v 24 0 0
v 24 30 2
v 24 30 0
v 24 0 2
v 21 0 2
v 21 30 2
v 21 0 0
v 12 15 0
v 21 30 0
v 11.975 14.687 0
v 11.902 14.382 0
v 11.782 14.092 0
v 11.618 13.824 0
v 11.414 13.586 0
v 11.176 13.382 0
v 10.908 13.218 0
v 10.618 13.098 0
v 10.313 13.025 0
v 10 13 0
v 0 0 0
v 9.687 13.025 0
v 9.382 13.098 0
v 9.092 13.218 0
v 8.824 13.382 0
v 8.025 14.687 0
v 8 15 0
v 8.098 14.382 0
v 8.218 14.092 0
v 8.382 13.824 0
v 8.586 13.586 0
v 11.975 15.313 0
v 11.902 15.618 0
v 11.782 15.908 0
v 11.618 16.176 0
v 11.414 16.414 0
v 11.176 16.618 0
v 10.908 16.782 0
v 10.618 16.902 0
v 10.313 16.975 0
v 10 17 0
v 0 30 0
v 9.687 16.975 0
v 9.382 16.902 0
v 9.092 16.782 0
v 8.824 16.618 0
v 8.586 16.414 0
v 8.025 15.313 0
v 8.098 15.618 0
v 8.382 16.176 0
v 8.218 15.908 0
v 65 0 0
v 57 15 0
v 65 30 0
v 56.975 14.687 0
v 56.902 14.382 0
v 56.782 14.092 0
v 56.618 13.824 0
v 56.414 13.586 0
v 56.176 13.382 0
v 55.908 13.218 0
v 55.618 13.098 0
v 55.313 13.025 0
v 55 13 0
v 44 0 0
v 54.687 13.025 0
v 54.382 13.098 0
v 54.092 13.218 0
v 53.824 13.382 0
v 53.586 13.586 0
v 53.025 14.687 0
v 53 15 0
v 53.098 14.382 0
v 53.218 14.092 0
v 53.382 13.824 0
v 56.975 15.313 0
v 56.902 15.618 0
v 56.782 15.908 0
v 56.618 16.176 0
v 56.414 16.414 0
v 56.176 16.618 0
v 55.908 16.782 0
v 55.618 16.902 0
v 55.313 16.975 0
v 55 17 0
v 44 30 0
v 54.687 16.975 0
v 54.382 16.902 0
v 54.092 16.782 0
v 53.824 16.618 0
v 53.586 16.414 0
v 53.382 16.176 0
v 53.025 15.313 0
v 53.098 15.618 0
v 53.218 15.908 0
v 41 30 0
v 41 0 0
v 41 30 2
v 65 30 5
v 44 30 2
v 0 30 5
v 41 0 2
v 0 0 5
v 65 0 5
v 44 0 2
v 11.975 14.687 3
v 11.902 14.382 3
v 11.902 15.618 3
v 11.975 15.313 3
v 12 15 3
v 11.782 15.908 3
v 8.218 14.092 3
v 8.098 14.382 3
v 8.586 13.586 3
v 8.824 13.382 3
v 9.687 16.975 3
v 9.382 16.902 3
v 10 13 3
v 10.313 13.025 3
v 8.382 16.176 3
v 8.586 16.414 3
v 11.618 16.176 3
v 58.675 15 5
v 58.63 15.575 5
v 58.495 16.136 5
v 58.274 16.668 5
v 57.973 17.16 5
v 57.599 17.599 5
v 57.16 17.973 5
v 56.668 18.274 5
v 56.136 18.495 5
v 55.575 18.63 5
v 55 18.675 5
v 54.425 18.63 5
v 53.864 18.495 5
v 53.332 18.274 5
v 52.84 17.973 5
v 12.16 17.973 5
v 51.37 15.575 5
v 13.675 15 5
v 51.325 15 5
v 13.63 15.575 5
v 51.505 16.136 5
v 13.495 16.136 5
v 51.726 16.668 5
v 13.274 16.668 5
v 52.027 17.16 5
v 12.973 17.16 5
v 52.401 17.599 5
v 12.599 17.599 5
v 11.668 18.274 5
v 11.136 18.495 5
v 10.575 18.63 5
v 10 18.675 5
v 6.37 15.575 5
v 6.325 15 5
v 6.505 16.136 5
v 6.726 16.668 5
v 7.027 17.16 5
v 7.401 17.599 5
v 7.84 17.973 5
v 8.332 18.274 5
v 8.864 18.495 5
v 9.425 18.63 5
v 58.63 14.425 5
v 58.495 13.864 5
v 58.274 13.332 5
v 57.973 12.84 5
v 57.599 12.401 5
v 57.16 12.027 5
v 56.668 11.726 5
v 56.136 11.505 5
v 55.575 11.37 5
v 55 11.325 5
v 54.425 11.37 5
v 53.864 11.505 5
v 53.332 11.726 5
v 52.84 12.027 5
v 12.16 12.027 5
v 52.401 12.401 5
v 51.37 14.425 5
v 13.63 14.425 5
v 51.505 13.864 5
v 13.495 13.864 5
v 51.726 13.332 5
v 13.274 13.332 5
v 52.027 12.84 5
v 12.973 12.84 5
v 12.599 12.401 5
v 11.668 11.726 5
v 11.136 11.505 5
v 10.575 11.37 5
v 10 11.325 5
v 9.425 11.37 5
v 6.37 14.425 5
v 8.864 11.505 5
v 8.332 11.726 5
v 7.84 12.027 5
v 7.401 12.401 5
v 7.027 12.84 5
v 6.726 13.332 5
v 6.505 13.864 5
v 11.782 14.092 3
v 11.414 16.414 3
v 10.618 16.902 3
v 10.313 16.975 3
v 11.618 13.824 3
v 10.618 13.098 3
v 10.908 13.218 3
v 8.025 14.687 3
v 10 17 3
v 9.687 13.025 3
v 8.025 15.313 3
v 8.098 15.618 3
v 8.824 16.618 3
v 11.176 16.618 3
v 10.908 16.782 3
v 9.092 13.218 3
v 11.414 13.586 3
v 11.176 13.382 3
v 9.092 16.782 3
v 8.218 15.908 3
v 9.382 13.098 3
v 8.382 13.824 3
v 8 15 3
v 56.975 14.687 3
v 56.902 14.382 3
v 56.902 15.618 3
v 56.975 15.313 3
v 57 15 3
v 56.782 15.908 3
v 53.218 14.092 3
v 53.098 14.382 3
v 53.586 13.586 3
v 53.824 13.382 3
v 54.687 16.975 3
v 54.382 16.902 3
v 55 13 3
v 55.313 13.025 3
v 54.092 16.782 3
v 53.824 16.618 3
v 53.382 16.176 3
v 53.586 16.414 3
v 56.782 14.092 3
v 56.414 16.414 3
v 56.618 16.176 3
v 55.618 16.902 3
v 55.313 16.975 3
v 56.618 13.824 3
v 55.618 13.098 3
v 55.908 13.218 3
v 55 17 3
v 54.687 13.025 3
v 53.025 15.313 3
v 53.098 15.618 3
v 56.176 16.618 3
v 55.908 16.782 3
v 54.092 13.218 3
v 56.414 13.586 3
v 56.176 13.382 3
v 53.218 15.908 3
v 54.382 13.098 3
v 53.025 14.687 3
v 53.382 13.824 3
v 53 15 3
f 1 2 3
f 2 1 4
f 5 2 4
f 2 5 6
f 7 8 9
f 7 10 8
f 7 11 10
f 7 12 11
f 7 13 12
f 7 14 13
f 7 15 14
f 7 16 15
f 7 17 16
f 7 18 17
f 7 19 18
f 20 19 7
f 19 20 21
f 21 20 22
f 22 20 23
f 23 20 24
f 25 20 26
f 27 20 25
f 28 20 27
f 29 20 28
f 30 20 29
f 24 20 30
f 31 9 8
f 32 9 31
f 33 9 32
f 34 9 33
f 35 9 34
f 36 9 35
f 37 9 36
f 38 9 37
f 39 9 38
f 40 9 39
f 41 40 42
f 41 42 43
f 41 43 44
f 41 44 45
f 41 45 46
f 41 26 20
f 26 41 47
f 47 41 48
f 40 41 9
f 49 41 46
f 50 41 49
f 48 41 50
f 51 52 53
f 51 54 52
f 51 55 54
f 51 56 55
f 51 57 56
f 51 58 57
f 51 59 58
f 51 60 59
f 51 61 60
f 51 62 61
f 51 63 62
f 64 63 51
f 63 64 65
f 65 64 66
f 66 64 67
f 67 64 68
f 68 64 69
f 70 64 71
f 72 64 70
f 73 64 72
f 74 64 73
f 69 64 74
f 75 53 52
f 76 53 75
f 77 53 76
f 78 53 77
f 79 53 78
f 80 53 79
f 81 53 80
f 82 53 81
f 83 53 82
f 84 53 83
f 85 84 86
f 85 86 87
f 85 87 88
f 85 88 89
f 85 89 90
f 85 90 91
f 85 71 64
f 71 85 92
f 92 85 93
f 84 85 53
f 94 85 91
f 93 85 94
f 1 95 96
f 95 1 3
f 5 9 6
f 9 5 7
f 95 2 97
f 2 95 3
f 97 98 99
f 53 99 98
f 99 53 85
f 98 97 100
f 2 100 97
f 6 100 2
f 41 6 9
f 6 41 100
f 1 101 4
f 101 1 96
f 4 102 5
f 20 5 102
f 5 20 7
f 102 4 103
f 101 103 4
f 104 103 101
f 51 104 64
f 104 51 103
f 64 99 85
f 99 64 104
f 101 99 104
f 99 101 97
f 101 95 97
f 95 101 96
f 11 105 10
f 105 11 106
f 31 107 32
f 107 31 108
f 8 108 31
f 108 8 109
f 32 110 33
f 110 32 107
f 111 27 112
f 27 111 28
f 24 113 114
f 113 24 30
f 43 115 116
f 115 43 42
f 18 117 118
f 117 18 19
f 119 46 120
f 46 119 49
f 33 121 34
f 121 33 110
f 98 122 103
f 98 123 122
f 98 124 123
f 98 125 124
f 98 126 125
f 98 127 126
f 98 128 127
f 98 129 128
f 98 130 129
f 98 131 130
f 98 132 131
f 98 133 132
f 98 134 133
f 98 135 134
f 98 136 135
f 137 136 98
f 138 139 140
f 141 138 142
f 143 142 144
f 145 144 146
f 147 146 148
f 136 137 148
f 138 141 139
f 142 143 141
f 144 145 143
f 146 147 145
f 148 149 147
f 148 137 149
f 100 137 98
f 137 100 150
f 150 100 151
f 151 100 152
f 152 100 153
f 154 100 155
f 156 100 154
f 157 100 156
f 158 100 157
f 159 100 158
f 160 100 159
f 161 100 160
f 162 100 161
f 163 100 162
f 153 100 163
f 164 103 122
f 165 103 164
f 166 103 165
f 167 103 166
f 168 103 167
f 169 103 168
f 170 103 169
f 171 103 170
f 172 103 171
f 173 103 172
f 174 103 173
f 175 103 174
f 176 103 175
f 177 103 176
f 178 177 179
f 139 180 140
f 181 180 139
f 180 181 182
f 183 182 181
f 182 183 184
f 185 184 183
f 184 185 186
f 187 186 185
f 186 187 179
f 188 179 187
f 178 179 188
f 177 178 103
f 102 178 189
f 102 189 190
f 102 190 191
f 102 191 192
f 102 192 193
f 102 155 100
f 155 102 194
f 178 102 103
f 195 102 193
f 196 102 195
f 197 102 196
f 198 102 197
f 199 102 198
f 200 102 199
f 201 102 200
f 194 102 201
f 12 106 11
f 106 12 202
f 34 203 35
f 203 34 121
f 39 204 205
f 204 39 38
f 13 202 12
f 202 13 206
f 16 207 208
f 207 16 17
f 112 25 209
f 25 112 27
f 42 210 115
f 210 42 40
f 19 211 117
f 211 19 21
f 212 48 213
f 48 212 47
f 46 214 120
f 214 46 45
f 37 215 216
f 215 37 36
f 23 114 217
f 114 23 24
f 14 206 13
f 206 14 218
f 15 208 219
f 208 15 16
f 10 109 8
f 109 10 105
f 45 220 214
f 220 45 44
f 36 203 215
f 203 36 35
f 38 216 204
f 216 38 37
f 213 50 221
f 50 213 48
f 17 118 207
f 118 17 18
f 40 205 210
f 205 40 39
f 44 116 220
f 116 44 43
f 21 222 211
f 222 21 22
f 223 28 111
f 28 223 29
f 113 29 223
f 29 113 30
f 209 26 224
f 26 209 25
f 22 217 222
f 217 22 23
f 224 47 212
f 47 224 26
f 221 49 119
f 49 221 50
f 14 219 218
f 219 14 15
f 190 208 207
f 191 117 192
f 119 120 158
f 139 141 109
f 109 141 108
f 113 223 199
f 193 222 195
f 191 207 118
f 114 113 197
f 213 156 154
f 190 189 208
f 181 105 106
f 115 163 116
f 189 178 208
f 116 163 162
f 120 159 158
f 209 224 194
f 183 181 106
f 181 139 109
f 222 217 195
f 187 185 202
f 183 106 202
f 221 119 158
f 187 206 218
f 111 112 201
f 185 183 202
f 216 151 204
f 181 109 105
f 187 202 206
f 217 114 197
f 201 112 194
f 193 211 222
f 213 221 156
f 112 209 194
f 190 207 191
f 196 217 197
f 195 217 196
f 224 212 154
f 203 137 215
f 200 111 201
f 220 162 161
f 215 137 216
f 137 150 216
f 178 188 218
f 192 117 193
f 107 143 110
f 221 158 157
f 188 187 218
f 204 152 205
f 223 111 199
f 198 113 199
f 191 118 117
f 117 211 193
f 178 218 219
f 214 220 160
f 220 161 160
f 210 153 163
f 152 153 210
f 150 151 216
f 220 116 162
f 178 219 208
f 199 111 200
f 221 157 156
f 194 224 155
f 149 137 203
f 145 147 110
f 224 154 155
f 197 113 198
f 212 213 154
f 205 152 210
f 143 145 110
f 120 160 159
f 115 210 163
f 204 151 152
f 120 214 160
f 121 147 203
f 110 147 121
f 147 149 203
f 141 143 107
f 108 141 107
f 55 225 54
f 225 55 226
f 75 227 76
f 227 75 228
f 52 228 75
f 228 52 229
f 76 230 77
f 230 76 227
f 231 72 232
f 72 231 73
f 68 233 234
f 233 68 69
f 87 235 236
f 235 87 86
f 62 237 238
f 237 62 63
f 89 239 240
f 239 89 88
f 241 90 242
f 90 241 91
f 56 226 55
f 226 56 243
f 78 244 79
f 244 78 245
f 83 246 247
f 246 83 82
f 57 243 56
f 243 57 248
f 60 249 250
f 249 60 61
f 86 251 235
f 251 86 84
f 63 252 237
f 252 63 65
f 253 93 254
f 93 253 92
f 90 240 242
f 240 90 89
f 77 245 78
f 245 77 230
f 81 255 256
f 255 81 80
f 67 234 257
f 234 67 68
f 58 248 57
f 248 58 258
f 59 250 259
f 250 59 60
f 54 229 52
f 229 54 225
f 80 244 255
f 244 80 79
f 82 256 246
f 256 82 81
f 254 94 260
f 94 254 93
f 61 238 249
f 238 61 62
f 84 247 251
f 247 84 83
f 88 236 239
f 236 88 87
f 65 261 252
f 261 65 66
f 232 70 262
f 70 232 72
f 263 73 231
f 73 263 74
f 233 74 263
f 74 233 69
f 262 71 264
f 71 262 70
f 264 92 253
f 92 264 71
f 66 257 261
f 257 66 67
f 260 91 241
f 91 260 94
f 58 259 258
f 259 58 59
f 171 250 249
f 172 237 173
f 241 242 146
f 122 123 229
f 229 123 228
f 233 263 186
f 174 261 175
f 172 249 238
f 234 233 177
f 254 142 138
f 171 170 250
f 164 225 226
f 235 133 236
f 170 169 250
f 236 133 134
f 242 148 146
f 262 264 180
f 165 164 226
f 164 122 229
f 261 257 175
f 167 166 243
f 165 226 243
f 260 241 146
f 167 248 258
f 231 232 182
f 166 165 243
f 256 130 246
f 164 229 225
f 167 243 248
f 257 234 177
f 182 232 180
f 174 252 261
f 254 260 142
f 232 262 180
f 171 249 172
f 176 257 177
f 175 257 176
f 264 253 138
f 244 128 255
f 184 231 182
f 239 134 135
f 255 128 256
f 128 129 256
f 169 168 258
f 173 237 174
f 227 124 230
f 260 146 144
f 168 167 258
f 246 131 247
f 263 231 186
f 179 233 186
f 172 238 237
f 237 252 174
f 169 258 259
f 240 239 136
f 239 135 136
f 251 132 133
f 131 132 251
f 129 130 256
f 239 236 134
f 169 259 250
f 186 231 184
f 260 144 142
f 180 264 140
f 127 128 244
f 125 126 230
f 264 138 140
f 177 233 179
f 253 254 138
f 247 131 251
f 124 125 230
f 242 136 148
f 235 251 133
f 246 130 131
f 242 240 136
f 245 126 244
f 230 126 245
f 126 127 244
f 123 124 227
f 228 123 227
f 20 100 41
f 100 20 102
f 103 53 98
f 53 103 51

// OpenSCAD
/* Wire End Clamp for Model Railroad.
   Clamp Bus wire to end of layout, with slots to separate
   and hold two wires in position.
*/
/***** Display options while rendering *****
 *  disable
 !  show only
 #  highlight / debug
 %  transparent / background
*/
/*  PARAMETERS - values in brackets are suggested starting values)  */
/* [Open Parameters:] */
// Width of clamp
b_width = 65;
// Height of clamp
b_height = 30;
// Width of gap
gap_w = 3;
// Depth of gap
gap_d = 2;
// Distance between gaps
gap_sep = 20;

// Main Body
module main(){
    // Main Bracket
    linear_extrude(height = 5){
        square([b_width,b_height],center=false);
    }
}
module gaps(x,y,z){
    //calculate and build the gaps
    // offset from edge of bracket
    offset = (b_width/2)-(gap_sep/2)-(gap_w/2);
    translate([offset,0,0]){
        // first gap
        cube([gap_w,b_height,gap_d]);
        // second gap
        translate([gap_sep,0,0]){
            cube([gap_w,b_height,gap_d]);
        }
    }
}
module screw_holes(){
    //first hole
    translate([10,b_height/2,0]){
        cylinder(h=5,d=4,$fn=40,center=false);
        //countersink it
        translate([0,0,3]){
            cylinder(h=2,d1=4,d2=7.35,$fn=40,center=false);
        }
    }
    offset = b_width - 10;
    //second hole
    translate([offset,b_height/2,0]){
        cylinder(h=5, d=4,$fn=40,center=false);
        //countersink it
        translate([0,0,3]){
            cylinder(h=2,d1=4,d2=7.35,$fn=40,center=false);
        }
    }
}
// Now put it all together
    difference(){
        main();
        gaps();
        screw_holes();
    }
